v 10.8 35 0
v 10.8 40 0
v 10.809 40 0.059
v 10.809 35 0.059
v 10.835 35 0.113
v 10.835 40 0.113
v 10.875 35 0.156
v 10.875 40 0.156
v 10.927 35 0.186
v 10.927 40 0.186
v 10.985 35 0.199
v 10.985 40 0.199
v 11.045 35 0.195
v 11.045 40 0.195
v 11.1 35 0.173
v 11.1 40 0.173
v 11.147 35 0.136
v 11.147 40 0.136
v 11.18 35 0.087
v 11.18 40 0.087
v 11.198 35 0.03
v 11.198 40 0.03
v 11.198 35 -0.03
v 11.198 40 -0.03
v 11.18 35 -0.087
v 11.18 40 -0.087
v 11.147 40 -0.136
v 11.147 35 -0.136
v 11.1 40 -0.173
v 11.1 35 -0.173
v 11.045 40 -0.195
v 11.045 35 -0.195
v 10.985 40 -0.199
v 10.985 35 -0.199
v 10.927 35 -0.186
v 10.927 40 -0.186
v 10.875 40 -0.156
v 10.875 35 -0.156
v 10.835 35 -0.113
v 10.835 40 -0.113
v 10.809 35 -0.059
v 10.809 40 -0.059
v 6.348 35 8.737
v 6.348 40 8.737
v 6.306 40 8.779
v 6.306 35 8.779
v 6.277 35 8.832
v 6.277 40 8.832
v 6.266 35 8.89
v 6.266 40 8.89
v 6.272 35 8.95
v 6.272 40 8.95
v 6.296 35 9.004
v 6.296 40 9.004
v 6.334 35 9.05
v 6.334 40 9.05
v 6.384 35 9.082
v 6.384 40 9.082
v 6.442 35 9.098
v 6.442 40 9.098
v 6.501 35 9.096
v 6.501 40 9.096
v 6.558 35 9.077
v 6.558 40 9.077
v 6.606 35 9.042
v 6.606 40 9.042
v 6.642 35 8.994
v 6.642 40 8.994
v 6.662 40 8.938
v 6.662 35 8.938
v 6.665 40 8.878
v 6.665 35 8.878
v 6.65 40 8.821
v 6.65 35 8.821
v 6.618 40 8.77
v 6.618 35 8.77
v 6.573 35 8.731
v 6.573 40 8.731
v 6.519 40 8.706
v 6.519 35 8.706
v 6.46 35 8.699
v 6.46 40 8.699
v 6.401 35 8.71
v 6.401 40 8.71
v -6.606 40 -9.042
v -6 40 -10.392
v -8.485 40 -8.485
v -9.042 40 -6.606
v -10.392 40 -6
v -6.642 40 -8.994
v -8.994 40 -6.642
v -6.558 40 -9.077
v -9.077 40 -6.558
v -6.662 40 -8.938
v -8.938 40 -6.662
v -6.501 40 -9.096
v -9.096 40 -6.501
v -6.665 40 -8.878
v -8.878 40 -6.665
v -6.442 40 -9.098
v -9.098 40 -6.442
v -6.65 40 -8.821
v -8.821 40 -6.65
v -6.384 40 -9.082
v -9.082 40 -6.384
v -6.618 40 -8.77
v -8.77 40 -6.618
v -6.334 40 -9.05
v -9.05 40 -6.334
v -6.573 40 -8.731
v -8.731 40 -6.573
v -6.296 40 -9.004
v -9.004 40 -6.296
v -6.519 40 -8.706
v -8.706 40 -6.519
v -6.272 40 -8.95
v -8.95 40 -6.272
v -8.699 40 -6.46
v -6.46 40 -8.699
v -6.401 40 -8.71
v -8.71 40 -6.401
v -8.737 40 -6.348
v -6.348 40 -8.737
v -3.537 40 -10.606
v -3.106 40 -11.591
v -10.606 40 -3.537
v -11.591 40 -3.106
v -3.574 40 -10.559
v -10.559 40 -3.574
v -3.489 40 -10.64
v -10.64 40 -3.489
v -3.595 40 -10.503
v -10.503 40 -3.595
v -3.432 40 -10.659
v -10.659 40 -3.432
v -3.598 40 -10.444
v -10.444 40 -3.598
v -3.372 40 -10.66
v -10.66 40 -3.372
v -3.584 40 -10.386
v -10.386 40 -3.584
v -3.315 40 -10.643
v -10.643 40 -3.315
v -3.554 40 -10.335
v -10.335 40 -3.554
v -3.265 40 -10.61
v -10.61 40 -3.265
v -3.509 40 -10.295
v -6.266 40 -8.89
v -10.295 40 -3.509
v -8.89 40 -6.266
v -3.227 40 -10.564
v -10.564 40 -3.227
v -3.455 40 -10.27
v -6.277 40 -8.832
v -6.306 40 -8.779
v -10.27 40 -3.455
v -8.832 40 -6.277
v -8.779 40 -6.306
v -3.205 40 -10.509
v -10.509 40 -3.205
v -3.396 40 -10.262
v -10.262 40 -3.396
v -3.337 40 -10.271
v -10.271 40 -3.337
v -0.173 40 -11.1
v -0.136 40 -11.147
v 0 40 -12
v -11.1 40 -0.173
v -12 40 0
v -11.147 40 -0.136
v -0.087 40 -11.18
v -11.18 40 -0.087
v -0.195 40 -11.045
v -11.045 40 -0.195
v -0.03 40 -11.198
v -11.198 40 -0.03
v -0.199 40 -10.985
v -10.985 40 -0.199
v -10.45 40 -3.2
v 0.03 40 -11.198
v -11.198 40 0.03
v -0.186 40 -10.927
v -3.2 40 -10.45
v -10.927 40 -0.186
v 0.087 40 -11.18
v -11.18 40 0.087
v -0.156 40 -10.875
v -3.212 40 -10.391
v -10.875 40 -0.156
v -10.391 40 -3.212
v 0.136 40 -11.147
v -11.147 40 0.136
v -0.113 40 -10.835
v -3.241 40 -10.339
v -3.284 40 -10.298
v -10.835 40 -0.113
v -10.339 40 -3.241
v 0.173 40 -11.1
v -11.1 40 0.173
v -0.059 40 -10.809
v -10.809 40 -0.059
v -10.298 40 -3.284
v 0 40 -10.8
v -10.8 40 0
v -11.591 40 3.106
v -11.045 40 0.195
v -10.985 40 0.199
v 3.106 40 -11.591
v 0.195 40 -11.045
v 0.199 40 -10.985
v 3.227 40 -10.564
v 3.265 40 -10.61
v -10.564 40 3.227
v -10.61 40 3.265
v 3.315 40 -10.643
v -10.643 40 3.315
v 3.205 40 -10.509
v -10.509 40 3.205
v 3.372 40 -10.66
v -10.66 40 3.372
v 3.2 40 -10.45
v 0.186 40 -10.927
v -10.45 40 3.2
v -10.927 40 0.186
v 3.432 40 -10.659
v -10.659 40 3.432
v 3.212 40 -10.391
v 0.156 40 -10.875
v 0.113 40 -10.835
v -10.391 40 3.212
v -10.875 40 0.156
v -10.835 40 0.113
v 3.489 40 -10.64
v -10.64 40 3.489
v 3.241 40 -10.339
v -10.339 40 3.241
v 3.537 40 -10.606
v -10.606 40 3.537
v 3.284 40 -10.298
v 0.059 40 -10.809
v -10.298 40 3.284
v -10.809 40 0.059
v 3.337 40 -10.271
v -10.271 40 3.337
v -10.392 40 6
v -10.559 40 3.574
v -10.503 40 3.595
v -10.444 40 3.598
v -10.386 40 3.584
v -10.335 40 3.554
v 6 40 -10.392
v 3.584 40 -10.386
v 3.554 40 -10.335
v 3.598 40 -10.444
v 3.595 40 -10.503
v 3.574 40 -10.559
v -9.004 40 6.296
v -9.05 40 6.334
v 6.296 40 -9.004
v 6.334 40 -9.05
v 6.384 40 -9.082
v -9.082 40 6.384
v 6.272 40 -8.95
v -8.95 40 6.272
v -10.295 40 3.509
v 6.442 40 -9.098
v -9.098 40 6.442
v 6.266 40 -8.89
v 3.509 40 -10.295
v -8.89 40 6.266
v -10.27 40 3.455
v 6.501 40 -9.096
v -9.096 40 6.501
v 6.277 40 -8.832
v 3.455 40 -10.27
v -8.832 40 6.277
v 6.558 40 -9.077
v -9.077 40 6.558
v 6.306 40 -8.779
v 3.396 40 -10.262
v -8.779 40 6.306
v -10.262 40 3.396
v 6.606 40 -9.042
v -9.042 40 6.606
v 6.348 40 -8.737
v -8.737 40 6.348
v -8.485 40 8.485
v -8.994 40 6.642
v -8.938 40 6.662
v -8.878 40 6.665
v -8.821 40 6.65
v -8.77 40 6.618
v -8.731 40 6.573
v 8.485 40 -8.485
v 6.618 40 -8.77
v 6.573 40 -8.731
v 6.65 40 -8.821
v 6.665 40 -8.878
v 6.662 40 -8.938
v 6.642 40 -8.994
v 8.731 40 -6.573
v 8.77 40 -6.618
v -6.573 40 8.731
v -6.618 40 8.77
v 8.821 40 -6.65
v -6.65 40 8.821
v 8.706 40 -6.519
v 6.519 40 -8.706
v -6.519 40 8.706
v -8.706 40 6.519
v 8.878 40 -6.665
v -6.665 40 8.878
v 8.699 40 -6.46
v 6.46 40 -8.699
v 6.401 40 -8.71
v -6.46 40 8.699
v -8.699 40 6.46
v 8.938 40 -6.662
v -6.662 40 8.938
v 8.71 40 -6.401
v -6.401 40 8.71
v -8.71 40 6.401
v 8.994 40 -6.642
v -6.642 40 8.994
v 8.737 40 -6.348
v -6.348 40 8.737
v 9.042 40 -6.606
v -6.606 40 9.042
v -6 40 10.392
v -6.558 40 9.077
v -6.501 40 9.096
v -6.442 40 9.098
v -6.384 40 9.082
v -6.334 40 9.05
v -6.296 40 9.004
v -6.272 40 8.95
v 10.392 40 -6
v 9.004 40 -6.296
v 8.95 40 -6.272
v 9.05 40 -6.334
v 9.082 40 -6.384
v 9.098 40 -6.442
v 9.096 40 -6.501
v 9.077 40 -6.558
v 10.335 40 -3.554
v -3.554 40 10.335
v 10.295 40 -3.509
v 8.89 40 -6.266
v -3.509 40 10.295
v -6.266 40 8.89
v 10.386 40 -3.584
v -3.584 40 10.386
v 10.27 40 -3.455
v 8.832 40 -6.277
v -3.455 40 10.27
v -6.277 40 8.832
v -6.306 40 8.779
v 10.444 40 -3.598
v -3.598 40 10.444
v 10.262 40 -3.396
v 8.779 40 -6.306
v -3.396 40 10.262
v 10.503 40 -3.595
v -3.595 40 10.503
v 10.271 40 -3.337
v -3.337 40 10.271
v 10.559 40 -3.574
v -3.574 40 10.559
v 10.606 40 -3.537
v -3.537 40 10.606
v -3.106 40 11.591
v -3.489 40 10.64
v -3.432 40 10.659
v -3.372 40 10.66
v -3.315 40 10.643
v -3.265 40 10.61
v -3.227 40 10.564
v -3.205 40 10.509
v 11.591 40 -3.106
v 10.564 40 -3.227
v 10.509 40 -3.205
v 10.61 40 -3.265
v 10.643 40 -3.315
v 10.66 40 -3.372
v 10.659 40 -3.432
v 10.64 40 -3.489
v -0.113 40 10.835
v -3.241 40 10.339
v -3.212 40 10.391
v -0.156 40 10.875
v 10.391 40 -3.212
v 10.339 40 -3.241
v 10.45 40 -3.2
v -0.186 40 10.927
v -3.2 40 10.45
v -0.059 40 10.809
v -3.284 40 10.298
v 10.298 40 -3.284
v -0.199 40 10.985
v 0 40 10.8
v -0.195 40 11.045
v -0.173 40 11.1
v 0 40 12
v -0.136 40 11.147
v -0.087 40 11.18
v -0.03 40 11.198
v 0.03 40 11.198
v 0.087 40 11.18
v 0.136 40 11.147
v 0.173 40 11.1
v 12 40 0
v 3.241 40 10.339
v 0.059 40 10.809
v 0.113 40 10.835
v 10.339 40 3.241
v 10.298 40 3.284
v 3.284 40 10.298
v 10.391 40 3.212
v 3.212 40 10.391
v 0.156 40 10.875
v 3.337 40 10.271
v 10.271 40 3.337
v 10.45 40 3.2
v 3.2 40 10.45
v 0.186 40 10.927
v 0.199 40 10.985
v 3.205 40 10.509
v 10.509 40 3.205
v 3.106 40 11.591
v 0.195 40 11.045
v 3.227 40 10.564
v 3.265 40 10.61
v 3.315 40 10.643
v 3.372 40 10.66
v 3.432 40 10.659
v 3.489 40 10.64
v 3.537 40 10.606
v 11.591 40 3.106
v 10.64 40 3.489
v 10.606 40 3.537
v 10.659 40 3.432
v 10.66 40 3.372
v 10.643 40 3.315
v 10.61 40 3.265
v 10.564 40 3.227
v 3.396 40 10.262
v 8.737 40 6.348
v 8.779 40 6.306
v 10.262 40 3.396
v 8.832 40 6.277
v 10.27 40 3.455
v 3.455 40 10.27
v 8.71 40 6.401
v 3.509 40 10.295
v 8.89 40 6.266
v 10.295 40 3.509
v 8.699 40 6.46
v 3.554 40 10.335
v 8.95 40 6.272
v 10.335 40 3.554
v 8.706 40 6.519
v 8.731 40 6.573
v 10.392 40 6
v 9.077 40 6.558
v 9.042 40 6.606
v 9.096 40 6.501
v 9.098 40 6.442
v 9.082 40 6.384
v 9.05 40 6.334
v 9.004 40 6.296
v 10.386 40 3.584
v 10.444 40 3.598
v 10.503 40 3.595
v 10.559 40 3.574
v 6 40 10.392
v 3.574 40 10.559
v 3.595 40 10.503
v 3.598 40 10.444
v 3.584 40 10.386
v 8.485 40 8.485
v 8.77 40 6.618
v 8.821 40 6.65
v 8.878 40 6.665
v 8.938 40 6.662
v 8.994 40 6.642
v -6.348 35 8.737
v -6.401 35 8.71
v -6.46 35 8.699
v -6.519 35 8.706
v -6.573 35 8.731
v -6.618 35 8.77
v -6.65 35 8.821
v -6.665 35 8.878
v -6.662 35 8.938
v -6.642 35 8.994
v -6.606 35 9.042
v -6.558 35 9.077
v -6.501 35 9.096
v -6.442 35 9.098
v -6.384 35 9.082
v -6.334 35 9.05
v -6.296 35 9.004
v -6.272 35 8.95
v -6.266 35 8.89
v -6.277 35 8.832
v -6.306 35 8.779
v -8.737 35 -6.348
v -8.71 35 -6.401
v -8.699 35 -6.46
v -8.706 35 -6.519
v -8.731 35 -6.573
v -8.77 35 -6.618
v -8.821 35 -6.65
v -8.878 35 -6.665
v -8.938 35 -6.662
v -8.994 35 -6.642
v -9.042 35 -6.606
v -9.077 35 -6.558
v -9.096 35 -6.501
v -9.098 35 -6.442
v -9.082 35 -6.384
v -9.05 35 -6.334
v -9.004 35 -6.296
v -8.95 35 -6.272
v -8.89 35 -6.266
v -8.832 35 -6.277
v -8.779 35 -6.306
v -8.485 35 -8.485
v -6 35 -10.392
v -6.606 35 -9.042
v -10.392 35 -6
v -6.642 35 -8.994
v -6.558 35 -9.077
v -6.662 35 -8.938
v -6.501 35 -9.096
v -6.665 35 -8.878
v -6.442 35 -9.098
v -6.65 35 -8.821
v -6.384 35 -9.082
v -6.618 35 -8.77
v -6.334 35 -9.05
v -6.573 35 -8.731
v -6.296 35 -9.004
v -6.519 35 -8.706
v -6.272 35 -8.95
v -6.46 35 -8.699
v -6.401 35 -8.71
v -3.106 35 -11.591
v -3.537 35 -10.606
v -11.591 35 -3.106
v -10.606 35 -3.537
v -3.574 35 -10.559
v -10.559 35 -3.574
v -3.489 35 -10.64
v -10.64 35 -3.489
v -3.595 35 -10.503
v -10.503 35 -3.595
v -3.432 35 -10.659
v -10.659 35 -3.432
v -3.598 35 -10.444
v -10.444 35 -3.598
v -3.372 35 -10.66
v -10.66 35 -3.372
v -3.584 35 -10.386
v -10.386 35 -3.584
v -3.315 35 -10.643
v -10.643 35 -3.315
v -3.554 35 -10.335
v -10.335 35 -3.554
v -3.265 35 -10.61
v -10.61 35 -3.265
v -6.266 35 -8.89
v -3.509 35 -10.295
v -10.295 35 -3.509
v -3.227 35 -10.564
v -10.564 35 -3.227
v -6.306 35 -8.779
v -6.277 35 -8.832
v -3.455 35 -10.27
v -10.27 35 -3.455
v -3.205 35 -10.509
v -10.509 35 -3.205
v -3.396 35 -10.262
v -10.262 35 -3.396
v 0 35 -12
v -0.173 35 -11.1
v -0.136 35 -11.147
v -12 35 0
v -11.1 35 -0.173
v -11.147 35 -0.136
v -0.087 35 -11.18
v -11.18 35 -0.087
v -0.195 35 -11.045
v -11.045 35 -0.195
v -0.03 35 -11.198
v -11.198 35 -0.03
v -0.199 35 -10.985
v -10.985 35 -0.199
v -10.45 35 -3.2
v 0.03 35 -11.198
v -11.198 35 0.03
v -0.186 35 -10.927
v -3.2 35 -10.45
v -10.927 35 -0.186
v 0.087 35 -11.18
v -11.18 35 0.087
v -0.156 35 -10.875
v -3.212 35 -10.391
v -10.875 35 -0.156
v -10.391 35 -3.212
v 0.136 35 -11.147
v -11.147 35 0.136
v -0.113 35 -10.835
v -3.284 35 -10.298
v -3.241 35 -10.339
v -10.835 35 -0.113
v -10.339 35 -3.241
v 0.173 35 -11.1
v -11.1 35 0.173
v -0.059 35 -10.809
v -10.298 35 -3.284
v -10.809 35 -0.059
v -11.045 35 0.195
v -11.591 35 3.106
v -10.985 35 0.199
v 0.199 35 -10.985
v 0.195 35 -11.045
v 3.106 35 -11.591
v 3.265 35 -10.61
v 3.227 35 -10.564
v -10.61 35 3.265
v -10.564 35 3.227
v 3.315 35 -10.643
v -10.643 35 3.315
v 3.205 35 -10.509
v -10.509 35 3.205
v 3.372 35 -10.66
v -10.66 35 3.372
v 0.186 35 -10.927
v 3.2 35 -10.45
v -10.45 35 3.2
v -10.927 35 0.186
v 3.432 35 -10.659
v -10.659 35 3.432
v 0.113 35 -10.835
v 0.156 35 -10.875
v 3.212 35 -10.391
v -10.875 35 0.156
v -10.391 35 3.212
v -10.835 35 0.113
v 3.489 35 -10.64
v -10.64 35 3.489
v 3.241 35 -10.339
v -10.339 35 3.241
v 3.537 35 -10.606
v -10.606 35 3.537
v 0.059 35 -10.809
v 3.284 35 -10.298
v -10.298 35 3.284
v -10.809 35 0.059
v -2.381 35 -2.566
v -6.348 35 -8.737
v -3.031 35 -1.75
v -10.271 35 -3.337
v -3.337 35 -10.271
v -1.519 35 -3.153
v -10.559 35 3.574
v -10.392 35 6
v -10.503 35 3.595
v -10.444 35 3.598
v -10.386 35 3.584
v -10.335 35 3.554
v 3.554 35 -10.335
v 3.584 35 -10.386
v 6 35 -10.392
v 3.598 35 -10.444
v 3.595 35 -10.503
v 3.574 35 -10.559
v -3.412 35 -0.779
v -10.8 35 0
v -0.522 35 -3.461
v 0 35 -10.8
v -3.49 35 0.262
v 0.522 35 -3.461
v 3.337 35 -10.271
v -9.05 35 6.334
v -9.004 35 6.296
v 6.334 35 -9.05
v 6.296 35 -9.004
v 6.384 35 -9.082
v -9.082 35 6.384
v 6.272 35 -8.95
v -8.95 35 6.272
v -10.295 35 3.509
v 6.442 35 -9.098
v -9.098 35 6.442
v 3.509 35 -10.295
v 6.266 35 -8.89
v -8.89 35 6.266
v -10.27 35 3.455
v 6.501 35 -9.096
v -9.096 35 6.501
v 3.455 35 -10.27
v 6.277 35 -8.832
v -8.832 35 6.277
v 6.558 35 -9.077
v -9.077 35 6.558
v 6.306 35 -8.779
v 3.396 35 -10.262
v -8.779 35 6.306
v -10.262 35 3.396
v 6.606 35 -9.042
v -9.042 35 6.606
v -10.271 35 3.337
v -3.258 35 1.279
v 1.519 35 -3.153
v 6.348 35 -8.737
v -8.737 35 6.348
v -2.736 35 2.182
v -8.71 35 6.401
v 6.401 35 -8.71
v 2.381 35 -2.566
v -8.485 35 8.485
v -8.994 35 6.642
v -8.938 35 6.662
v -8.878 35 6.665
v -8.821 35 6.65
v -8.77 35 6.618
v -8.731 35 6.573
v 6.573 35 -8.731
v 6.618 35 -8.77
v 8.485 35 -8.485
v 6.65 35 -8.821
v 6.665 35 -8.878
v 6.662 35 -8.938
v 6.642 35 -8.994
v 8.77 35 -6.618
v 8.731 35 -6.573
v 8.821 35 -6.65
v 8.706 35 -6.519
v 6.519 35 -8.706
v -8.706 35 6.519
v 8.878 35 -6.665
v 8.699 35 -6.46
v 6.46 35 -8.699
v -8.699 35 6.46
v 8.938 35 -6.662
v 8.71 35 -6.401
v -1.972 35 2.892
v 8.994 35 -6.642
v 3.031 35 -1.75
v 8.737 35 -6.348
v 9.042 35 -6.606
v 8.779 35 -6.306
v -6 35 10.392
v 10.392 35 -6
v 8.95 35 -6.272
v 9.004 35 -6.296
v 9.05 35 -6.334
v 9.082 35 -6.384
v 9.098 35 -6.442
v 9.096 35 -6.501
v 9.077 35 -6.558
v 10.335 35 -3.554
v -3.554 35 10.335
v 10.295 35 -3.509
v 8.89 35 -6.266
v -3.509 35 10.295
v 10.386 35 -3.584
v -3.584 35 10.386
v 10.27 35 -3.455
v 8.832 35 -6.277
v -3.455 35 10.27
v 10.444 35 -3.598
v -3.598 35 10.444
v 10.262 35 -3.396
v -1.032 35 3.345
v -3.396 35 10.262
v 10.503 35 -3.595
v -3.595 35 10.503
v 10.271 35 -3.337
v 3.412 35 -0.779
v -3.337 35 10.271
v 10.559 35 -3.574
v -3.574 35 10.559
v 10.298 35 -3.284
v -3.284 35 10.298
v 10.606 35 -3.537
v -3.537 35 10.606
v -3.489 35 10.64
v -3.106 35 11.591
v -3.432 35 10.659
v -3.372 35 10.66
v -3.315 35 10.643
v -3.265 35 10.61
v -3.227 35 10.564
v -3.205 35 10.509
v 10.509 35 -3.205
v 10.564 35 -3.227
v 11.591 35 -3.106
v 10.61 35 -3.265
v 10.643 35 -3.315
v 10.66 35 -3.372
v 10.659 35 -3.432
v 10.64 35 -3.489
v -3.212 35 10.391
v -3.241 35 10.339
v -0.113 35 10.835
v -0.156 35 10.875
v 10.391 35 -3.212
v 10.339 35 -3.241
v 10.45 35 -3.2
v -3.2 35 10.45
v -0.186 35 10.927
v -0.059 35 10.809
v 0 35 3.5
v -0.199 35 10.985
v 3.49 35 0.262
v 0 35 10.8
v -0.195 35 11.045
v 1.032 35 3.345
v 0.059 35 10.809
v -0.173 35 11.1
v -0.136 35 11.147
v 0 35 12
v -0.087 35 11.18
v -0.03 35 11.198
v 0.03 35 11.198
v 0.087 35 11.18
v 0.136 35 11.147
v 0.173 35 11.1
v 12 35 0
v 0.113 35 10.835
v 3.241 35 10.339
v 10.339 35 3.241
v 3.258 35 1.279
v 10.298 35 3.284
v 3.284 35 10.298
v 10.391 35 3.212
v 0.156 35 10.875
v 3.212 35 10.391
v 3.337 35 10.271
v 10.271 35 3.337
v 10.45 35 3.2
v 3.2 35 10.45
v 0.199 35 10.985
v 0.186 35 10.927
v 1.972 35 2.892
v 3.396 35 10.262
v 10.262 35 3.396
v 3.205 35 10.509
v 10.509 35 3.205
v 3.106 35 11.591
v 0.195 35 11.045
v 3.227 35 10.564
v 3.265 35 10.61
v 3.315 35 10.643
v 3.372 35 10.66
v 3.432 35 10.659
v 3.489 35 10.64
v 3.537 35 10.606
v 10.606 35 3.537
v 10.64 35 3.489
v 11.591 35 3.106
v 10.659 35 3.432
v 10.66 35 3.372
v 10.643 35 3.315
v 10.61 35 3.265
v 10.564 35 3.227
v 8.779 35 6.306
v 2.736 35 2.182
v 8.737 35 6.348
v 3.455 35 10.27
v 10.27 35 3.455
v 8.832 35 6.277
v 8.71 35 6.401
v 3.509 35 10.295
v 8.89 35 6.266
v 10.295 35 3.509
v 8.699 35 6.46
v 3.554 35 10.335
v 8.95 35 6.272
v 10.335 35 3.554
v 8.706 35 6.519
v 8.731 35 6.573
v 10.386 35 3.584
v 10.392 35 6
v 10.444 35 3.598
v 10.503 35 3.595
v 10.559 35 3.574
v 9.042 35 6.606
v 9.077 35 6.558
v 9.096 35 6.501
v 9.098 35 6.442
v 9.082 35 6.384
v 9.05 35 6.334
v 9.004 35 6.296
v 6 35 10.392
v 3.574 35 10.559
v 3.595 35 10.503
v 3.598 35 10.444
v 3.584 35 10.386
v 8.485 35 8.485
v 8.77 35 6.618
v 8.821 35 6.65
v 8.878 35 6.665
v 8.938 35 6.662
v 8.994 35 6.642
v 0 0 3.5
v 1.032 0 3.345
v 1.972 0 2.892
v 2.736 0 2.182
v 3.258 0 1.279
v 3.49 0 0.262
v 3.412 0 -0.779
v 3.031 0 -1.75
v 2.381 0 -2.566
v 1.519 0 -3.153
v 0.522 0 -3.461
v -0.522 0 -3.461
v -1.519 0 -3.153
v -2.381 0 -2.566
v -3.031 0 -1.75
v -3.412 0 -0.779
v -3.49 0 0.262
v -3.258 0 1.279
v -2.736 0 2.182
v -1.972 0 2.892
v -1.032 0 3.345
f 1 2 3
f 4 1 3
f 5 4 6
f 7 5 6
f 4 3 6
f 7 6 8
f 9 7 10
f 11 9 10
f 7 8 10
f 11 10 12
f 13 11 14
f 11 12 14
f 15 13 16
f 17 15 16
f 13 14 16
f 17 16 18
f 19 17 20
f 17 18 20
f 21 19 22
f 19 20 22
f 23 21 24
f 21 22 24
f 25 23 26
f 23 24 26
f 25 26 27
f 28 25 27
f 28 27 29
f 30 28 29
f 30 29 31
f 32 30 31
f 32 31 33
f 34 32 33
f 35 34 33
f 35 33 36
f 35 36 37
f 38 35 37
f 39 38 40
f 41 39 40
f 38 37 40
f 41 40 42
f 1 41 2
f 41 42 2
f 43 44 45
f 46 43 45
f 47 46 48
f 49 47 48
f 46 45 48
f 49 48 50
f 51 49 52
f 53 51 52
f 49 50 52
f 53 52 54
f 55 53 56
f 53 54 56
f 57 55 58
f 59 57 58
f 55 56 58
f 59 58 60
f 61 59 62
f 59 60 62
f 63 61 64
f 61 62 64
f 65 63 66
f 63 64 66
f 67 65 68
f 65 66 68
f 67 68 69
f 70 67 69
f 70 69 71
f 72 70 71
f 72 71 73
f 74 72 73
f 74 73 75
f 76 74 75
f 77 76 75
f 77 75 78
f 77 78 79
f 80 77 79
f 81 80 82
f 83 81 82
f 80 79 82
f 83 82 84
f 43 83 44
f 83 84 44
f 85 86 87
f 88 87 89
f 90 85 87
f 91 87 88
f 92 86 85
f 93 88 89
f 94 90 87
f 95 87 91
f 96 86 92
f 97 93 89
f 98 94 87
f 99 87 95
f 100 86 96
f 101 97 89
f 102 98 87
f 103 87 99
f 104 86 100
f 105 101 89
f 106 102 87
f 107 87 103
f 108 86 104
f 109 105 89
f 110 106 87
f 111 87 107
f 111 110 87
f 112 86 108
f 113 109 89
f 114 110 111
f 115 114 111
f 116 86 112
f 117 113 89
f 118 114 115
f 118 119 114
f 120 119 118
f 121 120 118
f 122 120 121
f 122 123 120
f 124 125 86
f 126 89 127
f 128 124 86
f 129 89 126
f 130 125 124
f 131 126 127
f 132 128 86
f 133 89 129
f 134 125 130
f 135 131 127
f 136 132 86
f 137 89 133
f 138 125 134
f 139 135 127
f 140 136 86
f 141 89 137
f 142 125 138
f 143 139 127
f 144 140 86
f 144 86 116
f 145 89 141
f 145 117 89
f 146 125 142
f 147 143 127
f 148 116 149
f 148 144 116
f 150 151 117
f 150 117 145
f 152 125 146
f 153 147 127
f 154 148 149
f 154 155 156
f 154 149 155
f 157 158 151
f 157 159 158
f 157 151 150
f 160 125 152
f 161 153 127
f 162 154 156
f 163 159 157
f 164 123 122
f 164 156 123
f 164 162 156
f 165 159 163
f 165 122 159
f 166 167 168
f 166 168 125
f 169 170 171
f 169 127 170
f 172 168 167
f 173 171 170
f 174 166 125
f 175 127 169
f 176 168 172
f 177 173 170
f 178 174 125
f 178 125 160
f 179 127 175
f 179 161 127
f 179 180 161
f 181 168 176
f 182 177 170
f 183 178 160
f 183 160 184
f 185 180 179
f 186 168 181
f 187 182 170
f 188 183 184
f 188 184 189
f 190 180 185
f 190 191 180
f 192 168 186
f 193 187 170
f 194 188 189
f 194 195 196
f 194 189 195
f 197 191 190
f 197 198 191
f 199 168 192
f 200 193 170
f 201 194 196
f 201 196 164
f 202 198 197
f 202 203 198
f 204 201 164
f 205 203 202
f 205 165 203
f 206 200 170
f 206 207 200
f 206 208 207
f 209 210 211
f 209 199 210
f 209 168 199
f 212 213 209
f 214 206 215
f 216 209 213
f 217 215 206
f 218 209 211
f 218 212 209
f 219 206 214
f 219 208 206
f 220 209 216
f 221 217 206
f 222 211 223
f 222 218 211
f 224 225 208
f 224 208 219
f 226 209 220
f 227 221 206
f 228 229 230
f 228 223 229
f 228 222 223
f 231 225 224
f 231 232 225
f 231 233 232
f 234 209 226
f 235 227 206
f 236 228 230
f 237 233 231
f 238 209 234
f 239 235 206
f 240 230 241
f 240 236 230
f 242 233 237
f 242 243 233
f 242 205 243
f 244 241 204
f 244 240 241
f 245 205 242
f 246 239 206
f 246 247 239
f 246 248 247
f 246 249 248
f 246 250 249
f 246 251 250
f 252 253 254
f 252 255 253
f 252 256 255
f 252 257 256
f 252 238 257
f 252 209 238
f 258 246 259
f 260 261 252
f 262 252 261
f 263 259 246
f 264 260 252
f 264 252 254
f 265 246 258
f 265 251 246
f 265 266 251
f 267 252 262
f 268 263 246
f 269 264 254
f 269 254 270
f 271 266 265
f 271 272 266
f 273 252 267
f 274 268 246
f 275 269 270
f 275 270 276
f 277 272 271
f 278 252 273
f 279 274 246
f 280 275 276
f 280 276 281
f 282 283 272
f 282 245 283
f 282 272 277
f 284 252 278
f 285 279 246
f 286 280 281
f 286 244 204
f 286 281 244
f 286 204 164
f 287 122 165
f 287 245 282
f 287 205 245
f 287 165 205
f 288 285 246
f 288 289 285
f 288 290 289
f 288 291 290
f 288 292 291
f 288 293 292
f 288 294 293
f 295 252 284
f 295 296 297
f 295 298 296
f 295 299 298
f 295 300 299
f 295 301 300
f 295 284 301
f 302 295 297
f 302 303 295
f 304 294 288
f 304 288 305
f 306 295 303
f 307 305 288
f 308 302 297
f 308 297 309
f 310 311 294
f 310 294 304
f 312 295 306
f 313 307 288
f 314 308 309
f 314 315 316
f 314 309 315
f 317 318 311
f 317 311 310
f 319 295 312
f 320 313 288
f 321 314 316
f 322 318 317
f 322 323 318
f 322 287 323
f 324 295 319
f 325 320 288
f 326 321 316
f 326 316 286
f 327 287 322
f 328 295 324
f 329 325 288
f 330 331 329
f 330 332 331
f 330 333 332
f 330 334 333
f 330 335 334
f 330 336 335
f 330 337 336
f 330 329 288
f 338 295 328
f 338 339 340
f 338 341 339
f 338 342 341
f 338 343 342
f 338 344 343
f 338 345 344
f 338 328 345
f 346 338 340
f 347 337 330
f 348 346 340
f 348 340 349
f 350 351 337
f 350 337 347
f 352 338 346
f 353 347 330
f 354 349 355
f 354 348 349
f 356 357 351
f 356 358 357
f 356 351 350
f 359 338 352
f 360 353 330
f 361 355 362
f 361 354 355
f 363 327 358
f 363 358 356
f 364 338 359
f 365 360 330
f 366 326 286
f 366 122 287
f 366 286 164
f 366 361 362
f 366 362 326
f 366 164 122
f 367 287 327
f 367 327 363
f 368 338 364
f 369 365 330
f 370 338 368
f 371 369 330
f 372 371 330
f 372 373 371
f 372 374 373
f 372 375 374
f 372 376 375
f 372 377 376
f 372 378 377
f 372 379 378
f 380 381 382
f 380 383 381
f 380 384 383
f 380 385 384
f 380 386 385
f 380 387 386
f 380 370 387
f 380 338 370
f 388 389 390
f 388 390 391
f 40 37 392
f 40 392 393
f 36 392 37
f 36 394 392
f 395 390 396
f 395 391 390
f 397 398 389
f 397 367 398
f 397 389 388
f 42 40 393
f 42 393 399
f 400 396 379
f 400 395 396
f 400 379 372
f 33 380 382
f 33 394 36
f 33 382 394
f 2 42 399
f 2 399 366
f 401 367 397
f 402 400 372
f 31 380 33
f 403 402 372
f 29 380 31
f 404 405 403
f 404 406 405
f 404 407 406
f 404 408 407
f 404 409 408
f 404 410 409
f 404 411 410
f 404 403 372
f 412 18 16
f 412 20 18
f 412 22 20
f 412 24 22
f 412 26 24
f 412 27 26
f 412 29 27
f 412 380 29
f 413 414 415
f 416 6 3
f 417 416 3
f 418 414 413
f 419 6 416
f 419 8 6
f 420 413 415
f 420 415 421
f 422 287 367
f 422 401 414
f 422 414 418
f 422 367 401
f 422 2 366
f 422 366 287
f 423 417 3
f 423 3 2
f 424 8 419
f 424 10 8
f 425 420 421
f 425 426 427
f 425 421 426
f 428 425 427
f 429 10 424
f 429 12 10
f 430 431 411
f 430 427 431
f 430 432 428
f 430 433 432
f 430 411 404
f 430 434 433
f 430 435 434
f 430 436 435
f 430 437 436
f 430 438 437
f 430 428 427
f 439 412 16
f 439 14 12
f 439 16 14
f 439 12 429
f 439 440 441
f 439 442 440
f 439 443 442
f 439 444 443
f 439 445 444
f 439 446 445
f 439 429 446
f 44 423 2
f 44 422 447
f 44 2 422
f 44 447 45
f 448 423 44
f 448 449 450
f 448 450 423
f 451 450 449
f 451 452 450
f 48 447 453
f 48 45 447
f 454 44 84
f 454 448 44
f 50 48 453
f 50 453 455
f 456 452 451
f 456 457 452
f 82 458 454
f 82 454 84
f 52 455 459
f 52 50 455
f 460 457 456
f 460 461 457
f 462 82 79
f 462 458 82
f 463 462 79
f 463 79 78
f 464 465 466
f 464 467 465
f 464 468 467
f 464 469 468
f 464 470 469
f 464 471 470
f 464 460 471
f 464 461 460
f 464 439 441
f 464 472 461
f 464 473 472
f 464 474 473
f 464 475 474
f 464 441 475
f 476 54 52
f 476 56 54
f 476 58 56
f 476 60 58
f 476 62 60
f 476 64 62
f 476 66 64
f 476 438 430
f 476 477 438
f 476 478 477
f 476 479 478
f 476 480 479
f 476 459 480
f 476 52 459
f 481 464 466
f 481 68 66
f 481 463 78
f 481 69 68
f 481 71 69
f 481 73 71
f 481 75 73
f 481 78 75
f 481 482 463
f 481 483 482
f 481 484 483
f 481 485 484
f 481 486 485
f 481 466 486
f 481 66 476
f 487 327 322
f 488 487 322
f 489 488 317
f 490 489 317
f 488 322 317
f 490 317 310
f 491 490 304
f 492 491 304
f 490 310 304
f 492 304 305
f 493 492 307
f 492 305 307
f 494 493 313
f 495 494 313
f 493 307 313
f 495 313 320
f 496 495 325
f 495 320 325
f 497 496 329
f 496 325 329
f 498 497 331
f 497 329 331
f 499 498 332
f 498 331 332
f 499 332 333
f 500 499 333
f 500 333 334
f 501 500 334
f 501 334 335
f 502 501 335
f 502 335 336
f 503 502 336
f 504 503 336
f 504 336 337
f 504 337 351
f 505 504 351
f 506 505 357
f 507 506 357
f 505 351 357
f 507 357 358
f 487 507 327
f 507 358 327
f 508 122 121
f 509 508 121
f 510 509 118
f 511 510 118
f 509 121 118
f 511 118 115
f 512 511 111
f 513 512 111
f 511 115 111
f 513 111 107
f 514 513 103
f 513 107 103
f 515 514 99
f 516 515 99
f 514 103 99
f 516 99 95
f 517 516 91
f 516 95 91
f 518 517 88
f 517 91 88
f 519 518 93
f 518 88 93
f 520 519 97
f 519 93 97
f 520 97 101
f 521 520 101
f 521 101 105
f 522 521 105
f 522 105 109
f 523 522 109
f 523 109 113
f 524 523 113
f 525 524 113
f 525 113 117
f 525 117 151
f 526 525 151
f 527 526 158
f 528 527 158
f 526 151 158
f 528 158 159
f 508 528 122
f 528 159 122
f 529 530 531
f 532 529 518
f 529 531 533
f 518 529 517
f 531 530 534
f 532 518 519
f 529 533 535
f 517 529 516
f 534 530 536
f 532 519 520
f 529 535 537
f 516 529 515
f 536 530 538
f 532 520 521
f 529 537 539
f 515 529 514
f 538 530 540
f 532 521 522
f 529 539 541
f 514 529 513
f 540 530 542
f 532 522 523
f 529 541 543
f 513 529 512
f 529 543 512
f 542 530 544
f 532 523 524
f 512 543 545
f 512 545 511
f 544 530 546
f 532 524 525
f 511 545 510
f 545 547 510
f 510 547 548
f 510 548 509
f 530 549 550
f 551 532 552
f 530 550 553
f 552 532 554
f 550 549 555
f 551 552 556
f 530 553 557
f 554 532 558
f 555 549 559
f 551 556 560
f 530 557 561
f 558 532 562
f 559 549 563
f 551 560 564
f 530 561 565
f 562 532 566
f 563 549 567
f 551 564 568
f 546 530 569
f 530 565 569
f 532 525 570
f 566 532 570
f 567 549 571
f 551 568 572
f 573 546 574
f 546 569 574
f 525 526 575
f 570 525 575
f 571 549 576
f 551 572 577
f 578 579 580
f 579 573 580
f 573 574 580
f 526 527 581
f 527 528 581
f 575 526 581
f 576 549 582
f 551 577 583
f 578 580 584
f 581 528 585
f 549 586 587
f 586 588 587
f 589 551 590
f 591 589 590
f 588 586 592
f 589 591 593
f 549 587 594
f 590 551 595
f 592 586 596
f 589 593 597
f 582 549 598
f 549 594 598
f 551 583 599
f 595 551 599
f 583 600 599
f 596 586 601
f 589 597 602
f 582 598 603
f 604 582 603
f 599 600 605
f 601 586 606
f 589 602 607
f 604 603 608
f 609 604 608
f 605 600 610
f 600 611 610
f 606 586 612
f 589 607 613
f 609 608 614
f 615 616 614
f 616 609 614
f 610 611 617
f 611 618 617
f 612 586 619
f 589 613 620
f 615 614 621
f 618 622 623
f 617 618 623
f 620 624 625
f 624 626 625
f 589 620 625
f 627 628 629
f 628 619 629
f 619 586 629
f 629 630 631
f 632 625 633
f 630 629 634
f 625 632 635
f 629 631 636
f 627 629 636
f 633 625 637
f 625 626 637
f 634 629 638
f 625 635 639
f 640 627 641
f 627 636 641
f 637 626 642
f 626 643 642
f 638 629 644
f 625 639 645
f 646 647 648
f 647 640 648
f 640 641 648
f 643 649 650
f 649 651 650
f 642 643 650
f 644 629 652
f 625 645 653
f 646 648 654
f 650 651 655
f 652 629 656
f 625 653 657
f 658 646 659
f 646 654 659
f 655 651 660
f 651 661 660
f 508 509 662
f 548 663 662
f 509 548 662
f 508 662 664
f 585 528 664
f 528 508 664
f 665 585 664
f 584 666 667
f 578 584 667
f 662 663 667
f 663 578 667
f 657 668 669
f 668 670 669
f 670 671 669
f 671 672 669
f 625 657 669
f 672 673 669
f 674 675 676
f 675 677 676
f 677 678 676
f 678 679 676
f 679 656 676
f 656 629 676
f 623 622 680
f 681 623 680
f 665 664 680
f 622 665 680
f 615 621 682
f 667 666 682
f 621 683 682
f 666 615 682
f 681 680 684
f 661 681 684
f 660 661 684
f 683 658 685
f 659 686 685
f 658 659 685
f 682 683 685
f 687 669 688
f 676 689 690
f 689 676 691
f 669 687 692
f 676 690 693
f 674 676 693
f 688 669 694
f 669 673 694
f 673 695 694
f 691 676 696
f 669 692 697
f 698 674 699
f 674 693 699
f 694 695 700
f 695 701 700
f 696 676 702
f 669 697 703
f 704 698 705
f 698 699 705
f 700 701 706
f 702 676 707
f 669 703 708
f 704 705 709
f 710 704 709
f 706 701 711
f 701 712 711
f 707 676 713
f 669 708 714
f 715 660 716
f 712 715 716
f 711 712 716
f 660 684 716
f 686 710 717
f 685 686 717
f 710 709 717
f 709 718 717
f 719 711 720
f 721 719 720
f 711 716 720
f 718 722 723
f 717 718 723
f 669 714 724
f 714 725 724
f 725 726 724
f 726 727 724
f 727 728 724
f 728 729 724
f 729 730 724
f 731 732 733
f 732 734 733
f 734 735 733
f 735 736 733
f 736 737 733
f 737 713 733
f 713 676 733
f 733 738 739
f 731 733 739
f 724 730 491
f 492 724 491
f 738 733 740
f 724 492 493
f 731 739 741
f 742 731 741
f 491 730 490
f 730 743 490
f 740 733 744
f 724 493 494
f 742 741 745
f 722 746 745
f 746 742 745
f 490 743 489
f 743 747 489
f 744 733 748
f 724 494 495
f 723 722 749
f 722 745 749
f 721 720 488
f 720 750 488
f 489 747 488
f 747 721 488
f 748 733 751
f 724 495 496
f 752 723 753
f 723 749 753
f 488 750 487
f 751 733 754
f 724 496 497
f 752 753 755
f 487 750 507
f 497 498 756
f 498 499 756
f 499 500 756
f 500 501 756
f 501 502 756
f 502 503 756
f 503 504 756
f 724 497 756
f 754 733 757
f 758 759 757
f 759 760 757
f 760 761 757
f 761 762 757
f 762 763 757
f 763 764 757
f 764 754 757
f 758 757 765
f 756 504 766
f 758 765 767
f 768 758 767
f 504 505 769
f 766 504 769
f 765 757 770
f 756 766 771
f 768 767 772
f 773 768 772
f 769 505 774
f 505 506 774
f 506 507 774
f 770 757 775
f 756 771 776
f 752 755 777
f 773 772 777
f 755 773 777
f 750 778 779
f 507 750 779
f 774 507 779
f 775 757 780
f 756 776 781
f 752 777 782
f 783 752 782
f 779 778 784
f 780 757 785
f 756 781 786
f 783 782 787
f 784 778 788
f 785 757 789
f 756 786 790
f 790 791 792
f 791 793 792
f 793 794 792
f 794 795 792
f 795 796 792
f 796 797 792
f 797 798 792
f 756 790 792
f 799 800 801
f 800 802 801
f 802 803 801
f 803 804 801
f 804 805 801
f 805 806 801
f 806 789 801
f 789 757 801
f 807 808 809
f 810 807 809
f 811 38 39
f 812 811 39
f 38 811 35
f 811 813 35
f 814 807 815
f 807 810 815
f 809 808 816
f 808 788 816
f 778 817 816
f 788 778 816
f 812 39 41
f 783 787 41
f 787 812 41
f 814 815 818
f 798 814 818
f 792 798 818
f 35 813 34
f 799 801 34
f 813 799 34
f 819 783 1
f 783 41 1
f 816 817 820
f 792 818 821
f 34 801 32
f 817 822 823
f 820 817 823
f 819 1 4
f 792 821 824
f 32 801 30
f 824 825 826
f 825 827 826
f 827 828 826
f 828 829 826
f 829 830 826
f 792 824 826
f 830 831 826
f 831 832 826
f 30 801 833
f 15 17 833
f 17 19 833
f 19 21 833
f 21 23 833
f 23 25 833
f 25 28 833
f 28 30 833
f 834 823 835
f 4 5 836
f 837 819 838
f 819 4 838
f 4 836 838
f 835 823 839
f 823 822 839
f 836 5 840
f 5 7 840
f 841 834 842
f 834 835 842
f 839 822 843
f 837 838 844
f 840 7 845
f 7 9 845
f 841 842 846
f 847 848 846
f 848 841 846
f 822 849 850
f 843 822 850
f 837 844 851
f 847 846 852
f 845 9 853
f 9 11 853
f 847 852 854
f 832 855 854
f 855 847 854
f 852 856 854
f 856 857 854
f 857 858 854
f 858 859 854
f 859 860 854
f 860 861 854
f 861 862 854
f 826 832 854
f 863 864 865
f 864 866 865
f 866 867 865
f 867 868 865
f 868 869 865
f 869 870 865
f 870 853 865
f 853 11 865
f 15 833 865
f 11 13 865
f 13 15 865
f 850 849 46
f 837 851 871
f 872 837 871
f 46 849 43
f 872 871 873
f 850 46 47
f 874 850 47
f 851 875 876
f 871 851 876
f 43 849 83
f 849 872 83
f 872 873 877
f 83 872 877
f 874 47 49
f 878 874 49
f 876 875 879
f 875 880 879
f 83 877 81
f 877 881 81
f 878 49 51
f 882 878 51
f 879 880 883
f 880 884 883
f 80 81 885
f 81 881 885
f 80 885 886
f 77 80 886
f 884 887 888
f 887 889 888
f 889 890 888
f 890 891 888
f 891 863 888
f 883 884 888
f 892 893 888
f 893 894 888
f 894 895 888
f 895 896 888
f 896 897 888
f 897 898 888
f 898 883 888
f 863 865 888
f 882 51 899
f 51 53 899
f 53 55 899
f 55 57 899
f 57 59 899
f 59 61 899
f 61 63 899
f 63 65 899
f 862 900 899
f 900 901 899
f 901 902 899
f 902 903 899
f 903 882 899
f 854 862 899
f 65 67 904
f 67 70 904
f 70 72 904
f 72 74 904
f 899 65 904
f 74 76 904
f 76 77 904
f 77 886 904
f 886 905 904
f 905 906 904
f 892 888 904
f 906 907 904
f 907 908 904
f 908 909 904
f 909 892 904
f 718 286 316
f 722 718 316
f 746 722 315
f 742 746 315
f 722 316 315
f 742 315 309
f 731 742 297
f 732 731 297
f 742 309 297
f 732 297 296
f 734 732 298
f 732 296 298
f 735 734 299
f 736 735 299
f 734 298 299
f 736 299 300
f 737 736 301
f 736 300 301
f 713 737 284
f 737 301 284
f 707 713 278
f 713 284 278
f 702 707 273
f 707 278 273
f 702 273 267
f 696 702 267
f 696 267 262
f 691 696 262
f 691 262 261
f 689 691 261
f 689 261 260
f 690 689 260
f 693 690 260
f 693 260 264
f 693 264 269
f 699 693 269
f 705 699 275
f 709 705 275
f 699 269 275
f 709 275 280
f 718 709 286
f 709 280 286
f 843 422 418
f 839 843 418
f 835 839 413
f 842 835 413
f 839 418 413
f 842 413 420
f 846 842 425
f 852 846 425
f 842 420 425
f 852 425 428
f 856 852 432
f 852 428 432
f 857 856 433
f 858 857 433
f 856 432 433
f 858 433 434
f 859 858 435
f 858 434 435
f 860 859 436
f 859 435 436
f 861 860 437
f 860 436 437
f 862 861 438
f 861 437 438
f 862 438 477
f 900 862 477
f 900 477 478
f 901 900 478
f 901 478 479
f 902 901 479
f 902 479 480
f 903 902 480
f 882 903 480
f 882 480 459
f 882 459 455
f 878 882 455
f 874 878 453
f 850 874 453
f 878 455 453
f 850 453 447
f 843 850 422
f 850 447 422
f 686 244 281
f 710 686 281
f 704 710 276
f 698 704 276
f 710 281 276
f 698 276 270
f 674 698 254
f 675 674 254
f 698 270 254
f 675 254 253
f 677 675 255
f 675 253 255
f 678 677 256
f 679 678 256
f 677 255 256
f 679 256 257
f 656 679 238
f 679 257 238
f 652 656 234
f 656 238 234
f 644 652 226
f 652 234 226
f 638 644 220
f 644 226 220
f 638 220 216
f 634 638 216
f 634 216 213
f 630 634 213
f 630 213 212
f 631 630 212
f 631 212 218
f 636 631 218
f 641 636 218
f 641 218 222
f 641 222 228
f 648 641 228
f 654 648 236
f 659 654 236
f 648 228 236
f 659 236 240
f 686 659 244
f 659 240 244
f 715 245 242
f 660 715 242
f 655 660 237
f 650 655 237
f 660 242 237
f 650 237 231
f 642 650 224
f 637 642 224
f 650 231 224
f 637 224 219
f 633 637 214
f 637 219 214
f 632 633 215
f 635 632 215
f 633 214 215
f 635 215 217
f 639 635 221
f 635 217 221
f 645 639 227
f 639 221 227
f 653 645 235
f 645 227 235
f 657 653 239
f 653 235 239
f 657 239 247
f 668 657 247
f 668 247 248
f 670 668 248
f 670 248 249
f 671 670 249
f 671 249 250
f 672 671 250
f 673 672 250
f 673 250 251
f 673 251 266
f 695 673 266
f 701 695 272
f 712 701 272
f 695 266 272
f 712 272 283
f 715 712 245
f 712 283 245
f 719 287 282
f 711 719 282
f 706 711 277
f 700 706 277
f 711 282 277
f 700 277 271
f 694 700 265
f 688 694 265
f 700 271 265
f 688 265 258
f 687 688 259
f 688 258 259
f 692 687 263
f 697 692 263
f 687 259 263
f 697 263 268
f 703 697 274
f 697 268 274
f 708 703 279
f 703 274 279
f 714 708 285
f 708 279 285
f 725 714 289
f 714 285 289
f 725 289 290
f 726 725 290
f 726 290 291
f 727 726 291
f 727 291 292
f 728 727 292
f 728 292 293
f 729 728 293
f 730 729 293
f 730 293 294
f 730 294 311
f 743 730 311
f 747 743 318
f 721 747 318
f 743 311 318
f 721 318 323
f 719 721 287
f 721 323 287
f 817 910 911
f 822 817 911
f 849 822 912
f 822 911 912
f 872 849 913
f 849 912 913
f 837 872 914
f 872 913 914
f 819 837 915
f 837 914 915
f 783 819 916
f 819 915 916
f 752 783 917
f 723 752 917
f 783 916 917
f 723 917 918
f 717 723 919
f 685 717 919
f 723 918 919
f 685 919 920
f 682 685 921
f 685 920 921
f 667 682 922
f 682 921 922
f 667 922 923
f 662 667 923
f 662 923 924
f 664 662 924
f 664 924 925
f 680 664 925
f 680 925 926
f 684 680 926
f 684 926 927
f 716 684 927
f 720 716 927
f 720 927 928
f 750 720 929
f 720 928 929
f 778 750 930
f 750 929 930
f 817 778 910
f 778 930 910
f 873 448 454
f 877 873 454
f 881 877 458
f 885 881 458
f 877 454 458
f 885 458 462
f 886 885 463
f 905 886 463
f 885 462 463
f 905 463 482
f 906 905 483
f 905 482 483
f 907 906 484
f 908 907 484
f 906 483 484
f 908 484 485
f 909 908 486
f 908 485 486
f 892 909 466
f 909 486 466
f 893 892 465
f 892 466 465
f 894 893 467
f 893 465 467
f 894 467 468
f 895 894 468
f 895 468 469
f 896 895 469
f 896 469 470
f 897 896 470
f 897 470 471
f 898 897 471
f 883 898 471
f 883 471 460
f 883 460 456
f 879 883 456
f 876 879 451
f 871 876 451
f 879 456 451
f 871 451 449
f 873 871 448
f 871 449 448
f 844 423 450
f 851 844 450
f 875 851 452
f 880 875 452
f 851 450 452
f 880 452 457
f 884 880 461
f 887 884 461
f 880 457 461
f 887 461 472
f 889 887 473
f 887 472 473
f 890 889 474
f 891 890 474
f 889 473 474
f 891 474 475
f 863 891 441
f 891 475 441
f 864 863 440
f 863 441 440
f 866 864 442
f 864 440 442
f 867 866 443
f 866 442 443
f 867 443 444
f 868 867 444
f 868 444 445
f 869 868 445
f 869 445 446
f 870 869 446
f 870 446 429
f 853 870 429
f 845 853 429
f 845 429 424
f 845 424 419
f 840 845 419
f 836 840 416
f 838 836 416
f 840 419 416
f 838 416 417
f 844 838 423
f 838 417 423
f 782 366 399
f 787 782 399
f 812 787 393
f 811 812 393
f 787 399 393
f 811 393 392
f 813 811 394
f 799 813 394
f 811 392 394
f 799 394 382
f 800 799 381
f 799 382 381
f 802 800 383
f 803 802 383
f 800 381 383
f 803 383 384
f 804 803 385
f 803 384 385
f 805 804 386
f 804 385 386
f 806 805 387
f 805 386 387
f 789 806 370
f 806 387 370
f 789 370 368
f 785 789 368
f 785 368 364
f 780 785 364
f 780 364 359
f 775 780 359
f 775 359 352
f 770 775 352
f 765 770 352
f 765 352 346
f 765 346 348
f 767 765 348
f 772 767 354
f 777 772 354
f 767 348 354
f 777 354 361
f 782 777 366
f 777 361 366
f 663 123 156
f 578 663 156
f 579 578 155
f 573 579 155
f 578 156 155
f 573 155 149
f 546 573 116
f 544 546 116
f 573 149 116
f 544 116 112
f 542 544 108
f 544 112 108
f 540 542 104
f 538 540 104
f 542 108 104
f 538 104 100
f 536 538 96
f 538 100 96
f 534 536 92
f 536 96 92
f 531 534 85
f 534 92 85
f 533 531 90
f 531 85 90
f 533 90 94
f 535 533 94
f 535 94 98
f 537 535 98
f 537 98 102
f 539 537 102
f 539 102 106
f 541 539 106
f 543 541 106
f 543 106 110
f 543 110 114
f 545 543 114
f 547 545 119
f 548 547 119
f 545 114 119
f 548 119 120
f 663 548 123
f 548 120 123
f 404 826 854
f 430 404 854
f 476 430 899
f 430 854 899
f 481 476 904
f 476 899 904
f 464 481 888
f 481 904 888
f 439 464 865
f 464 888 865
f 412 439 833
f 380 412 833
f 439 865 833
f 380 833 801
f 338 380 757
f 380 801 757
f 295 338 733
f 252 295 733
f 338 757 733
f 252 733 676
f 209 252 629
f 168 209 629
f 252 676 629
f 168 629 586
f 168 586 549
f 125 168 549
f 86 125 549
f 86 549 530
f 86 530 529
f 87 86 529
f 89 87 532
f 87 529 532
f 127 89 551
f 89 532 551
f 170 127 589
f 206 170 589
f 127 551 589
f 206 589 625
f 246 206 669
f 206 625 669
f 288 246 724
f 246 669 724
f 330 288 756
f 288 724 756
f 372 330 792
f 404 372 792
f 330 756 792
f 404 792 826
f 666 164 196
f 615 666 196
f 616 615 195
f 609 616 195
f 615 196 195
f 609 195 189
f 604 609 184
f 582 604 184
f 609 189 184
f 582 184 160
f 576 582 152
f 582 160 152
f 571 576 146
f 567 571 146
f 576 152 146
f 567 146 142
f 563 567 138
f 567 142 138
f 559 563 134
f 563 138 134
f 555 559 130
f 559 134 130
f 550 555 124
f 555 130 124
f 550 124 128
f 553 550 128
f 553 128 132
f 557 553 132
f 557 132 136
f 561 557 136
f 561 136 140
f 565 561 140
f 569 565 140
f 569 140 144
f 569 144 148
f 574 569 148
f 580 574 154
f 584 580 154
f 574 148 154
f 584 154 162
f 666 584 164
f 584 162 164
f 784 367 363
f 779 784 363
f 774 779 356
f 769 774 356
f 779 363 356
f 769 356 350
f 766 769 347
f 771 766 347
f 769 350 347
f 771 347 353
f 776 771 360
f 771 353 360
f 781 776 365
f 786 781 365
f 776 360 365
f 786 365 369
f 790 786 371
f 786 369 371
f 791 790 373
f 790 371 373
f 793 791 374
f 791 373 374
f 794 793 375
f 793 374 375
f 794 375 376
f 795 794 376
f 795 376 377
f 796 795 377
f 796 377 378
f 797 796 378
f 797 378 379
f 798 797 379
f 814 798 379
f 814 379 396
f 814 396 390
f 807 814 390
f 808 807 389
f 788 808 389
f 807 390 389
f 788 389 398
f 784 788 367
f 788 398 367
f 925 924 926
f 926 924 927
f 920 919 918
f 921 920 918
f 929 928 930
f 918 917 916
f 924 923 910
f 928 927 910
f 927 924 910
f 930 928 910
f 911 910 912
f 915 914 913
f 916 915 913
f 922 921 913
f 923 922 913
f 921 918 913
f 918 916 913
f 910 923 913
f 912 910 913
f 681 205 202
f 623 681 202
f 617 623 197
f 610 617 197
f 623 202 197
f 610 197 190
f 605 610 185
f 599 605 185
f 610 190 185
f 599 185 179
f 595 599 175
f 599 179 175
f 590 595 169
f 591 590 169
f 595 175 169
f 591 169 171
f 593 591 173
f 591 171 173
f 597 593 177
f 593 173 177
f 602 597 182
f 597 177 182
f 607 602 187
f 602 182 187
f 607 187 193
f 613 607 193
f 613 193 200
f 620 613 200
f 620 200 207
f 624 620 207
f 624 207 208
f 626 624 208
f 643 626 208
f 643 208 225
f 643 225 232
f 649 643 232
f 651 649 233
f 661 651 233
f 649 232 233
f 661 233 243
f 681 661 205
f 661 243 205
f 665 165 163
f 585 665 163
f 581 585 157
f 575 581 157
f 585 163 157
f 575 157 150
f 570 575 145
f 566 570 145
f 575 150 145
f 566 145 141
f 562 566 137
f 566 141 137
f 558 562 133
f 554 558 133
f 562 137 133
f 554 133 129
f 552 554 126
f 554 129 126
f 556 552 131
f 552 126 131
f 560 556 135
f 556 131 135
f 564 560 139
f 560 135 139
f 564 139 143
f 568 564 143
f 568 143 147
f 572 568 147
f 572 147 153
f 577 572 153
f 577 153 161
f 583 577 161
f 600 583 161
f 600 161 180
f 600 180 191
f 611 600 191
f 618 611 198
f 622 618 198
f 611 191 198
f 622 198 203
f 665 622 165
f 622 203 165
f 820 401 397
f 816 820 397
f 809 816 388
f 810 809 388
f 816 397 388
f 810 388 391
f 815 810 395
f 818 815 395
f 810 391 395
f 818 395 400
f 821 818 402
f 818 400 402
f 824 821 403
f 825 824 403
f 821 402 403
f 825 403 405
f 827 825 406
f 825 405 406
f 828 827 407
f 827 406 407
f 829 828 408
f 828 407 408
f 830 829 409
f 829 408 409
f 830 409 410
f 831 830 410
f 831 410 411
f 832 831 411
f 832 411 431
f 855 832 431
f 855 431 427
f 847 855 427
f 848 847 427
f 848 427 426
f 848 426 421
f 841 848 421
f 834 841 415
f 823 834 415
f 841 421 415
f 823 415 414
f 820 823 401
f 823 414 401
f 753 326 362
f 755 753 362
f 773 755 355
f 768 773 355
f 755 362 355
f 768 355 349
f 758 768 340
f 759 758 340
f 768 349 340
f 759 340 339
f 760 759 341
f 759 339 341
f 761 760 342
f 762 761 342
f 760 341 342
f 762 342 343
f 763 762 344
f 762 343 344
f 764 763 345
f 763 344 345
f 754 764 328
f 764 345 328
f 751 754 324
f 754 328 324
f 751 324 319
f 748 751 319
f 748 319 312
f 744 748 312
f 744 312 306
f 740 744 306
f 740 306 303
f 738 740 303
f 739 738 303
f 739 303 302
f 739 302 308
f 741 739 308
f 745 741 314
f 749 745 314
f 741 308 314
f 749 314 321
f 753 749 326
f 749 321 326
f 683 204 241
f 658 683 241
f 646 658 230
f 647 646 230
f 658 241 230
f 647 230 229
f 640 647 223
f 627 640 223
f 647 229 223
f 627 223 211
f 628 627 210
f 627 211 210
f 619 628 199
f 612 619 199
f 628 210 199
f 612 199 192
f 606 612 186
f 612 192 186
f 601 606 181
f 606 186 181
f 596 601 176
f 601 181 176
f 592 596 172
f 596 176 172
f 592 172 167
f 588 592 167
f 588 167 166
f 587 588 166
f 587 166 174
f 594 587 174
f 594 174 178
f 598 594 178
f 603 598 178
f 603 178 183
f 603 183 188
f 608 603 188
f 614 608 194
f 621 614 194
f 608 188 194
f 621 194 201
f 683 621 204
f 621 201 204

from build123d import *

# Parameters (mm, degrees)
SKETCH1_R           = 3.5
BOSS_EXTRUDE1_DEPTH = 35
SKETCH2_R           = 12
BOSS_EXTRUDE2_DEPTH = 5
SKETCH3_R           = 0.2
CUT_EXTRUDE1_DEPTH  = 5
CIRPATTERN1_COUNT   = 20


with BuildPart() as part:
    # Sketch1 → Boss-Extrude1 (new body)
    with BuildSketch(Plane(origin=(0, 0, 0), x_dir=(1, 0, 0), z_dir=(0, 1, 0))):
        with Locations(Location((0, 0, 0), (0, 0, 270))):
            Circle(SKETCH1_R)
    extrude(amount=BOSS_EXTRUDE1_DEPTH)

    # Sketch2 → Boss-Extrude2 (add)
    with BuildSketch(Plane(origin=(0, 35, 0), x_dir=(1, 0, 0), z_dir=(0, 1, 0))):
        with Locations(Location((0, 0, 0), (0, 0, 270))):
            Circle(SKETCH2_R)
    extrude(amount=BOSS_EXTRUDE2_DEPTH)

    # Sketch3 → Cut-Extrude1 (cut)
    with BuildSketch(Plane(origin=(0, 40, 0), x_dir=(1, 0, 0), z_dir=(0, 1, 0))):
        with Locations(Location((0, 11, 0), (0, 0, 270))):
            Circle(SKETCH3_R)
    cut_extrude1 = extrude(amount=-CUT_EXTRUDE1_DEPTH, mode=Mode.SUBTRACT)

    # CirPattern1: Cut-Extrude1 ×20 about axis
    cirpattern1_axis = Axis((0, 0, 0), (0, 1, 0))
    for i in range(1, CIRPATTERN1_COUNT):
        add(cut_extrude1.rotate(cirpattern1_axis, i * 360 / CIRPATTERN1_COUNT), mode=Mode.SUBTRACT)


solid = part.part
